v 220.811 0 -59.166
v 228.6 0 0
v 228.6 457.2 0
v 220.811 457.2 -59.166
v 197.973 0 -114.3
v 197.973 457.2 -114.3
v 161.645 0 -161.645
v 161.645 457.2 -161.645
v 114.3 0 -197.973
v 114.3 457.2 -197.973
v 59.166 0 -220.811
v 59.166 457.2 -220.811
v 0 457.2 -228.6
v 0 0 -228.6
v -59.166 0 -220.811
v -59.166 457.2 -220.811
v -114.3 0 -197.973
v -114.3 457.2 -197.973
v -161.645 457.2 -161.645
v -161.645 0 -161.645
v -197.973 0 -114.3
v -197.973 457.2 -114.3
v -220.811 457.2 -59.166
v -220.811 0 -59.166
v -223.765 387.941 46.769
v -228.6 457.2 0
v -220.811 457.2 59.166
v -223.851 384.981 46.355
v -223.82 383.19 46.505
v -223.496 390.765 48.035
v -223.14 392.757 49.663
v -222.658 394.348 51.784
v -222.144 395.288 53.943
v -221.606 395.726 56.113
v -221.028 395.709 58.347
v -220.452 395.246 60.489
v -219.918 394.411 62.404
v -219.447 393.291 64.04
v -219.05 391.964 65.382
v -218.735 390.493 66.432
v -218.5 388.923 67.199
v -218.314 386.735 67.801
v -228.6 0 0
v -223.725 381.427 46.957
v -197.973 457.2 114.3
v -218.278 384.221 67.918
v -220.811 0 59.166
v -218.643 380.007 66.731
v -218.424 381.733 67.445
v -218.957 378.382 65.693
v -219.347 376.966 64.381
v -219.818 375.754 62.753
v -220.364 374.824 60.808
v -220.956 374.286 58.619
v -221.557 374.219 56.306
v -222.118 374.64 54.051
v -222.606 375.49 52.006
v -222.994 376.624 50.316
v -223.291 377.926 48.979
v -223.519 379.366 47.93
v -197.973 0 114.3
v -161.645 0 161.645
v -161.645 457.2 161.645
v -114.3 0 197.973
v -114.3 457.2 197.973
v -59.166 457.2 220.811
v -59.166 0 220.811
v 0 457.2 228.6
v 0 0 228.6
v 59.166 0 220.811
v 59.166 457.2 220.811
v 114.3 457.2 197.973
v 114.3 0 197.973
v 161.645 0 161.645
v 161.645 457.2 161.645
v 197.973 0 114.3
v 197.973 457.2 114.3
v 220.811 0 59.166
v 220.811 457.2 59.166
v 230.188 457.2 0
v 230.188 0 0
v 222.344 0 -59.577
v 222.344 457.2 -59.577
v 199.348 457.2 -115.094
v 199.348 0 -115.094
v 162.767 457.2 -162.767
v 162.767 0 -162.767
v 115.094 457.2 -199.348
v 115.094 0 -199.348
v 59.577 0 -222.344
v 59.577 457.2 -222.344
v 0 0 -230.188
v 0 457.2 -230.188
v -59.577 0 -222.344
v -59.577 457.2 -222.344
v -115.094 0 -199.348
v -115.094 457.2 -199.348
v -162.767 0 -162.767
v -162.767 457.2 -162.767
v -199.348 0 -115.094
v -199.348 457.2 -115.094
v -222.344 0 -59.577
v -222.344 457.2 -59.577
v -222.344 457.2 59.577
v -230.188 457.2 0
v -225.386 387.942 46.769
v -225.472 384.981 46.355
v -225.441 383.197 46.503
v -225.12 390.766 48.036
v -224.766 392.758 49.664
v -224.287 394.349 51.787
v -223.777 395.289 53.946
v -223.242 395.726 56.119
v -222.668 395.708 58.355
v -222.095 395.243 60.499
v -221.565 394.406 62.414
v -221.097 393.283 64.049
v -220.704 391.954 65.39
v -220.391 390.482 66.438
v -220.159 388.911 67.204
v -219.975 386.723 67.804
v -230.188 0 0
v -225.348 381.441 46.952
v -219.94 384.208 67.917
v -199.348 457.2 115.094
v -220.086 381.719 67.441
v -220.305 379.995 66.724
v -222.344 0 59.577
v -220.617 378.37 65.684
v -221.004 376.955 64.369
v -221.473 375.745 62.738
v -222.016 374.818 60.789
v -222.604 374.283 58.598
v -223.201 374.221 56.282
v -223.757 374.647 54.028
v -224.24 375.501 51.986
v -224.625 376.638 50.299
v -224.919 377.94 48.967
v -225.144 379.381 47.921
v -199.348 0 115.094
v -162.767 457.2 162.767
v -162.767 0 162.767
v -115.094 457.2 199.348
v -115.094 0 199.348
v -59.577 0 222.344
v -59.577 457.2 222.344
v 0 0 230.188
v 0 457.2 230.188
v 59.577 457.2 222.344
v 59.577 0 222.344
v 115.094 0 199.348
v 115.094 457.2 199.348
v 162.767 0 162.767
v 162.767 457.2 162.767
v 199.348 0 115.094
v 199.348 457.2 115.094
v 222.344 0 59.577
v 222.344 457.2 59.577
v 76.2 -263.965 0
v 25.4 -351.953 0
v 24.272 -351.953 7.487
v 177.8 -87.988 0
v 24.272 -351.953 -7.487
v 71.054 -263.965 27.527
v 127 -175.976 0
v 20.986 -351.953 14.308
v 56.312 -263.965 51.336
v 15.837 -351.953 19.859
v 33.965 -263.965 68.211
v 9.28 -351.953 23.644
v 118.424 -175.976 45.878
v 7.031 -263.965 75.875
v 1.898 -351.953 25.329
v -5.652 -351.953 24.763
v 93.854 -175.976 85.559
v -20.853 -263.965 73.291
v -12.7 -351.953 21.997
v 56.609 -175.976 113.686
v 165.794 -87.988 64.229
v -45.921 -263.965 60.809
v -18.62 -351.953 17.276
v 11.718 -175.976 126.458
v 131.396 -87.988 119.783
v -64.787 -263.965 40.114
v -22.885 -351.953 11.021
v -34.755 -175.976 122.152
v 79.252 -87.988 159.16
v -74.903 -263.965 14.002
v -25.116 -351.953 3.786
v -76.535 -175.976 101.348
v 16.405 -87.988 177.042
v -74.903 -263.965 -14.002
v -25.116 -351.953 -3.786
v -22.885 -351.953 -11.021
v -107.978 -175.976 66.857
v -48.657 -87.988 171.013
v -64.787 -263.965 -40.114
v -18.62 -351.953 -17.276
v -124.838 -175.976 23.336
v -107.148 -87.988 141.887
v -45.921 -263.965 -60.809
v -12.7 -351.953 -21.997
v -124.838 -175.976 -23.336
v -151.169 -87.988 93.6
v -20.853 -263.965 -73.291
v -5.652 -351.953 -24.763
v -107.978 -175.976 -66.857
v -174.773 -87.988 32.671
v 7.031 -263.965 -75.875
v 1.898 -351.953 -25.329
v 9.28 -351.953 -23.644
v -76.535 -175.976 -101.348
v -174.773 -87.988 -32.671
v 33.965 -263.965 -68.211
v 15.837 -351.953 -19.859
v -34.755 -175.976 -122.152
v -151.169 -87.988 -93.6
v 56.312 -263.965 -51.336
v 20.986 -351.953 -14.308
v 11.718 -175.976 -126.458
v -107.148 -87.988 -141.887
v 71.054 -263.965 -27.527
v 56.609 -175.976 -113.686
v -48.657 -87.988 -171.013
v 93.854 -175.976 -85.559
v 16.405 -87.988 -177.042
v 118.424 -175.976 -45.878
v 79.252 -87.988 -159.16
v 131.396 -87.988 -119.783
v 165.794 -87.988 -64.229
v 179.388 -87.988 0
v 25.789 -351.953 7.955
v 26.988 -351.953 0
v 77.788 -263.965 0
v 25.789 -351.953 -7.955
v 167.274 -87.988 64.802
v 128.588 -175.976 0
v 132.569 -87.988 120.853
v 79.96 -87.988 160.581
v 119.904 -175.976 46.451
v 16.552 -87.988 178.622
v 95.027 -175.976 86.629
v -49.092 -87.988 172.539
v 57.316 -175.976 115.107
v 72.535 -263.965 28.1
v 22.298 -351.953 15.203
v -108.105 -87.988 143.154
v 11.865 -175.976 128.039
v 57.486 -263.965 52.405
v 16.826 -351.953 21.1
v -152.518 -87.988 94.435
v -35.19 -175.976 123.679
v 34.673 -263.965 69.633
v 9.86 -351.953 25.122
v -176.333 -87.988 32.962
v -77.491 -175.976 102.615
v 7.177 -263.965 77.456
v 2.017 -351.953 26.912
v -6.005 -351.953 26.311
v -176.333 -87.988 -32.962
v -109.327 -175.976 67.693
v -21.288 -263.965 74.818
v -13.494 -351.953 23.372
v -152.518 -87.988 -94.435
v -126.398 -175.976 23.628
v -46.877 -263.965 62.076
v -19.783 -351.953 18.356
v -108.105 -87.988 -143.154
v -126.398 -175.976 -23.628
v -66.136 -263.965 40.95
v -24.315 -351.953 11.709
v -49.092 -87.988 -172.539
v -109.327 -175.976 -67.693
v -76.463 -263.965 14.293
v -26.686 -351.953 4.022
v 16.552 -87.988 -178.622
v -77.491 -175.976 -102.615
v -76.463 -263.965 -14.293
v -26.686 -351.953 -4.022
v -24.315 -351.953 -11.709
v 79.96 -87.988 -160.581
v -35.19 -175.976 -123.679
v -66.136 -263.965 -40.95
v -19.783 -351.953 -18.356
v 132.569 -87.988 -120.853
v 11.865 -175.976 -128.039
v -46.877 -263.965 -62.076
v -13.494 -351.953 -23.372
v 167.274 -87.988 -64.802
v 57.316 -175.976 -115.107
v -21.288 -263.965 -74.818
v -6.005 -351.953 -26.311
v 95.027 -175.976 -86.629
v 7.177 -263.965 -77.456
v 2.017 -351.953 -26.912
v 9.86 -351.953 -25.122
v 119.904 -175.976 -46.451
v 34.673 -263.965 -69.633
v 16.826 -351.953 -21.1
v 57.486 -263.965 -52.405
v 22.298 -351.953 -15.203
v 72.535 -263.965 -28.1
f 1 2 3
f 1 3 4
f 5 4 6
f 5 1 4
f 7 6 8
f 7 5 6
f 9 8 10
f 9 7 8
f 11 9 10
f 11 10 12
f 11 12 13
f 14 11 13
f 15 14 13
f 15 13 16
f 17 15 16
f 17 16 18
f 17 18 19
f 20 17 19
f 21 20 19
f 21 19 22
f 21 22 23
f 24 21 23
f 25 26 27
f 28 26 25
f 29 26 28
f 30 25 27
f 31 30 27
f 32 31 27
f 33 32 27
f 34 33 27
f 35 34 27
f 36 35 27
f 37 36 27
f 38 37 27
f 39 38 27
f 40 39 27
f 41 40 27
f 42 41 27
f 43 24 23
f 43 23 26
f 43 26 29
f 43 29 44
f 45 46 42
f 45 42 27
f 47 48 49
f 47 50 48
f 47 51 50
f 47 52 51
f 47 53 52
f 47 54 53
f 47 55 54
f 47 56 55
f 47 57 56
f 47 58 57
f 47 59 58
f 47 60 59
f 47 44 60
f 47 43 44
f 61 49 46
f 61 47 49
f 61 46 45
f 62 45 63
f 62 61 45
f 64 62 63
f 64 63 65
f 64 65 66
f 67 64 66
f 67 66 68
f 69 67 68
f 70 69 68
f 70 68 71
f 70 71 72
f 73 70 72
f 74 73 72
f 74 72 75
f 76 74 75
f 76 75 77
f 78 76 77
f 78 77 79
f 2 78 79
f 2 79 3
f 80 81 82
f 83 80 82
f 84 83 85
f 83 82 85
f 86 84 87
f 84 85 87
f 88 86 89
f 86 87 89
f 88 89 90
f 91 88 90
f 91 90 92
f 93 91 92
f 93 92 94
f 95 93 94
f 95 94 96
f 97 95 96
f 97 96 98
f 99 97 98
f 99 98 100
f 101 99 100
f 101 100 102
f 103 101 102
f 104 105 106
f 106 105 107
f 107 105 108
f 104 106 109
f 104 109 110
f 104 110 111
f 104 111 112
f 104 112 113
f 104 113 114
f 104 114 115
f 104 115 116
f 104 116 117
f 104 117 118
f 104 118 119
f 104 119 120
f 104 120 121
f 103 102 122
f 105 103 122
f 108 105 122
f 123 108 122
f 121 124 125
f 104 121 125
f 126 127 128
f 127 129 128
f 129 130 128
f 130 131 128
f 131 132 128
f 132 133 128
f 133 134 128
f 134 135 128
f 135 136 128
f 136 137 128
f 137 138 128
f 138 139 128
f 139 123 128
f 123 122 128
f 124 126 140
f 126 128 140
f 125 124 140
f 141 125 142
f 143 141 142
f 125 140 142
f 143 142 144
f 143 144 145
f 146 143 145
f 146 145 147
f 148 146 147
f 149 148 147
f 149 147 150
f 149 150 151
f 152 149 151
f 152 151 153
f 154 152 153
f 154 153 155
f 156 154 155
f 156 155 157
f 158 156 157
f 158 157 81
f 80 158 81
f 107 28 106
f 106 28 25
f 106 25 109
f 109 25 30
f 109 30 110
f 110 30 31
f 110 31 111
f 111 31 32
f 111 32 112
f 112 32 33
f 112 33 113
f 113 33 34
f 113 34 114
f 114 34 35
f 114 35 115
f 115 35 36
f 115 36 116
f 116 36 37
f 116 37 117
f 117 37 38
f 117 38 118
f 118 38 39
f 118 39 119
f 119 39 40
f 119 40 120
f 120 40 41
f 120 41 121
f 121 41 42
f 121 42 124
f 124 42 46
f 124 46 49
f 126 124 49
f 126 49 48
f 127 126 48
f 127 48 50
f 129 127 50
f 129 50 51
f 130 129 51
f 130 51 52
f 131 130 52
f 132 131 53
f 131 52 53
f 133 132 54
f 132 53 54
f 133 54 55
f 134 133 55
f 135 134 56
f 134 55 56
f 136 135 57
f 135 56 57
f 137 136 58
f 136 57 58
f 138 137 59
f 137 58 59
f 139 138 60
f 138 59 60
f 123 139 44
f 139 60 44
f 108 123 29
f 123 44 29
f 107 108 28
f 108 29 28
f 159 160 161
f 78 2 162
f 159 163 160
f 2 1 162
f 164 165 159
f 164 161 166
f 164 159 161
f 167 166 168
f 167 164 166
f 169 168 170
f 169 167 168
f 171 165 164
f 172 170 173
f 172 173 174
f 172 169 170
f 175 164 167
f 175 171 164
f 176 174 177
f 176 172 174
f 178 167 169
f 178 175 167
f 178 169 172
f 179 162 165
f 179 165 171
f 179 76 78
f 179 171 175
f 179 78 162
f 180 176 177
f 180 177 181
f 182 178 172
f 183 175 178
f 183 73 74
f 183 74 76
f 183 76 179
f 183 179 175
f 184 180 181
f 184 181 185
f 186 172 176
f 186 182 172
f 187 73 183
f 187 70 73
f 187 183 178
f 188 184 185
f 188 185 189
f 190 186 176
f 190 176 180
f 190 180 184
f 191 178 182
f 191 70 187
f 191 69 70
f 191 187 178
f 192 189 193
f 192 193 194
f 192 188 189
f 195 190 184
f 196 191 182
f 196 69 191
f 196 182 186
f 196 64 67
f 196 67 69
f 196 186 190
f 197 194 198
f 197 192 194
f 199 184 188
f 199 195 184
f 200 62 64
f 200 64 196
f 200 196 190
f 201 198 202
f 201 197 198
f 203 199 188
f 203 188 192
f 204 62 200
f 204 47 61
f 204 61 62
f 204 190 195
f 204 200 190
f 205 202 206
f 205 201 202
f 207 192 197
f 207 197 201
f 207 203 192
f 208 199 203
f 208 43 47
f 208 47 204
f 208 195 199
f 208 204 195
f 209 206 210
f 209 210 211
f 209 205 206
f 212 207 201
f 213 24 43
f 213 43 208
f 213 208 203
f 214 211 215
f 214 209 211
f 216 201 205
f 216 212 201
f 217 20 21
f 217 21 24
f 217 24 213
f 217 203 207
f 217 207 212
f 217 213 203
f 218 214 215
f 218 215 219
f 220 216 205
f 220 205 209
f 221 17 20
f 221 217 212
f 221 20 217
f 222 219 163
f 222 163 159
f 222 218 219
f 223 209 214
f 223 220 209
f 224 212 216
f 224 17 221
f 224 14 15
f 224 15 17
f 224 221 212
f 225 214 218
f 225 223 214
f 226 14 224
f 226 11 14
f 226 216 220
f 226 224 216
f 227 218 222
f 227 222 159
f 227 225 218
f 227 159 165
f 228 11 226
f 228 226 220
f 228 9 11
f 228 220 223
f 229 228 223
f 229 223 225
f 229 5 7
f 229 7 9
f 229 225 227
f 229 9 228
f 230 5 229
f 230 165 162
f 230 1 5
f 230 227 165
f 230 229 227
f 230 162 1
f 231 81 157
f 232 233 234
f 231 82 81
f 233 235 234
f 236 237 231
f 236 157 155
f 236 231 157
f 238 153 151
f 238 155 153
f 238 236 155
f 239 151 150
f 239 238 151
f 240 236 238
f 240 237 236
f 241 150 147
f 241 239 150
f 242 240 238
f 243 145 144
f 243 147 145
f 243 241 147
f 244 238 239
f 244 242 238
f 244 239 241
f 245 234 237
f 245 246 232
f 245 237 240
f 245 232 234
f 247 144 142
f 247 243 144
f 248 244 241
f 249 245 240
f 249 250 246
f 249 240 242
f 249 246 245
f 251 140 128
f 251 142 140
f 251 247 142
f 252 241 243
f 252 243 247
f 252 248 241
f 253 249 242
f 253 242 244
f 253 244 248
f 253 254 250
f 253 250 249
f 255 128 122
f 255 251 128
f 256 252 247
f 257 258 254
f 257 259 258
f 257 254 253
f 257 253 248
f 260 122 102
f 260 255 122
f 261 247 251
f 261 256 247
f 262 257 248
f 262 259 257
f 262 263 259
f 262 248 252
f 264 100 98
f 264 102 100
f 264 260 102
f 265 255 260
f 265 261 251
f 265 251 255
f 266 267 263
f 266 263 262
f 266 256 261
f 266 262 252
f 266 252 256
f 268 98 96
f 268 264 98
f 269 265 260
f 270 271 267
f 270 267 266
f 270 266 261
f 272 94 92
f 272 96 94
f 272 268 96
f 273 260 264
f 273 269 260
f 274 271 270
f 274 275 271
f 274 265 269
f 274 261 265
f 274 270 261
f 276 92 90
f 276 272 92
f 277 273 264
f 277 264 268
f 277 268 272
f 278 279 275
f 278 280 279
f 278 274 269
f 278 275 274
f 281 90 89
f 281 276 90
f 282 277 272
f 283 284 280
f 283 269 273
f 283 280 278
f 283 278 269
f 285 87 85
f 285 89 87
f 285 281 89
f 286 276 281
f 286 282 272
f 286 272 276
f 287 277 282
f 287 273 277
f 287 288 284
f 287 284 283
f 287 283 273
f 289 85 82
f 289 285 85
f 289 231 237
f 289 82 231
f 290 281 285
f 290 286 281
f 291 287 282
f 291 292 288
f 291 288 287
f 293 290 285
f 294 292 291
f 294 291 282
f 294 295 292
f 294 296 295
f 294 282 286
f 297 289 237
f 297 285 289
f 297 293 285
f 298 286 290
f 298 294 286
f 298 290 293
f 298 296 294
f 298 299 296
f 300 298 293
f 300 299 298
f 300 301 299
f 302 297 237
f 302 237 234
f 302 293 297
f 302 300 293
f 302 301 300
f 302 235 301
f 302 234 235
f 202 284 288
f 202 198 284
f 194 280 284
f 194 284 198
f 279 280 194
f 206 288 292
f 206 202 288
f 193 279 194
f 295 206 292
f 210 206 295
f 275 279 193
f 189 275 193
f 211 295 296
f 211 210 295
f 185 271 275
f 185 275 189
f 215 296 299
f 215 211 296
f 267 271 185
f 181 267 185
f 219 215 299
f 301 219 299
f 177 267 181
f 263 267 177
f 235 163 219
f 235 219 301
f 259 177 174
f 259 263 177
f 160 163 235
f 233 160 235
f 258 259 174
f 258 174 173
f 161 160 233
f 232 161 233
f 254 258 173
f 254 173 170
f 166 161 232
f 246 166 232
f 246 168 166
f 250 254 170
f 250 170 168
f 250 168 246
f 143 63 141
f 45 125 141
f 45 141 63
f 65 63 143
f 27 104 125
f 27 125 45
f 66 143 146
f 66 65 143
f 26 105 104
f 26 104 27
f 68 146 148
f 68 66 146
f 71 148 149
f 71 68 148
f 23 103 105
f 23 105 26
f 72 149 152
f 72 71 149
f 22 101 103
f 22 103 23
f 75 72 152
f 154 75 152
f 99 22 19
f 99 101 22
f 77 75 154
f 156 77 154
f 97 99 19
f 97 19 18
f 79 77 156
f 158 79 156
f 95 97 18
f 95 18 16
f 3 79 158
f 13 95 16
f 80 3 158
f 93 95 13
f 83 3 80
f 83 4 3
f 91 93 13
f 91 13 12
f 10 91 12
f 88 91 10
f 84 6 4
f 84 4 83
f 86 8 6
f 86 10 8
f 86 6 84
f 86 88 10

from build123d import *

# Parameters (mm, degrees)
SKETCH7_R           = 230.1875
SKETCH7_R_2         = 228.6
BOSS_EXTRUDE1_DEPTH = 457.2
SKETCH9_R           = 10.795
CUT_EXTRUDE1_DEPTH  = 304.8


with BuildPart() as part:
    # Sketch7 → Boss-Extrude1 (new body)
    with BuildSketch(Plane(origin=(0, 0, 0), x_dir=(1, 0, 0), z_dir=(0, 1, 0))):
        Circle(SKETCH7_R)
        Circle(SKETCH7_R_2, mode=Mode.SUBTRACT)
    extrude(amount=BOSS_EXTRUDE1_DEPTH)

    # Sketch8 → Revolve1 (revolve)
    with BuildSketch(Plane.XY):
        Polygon((228.6, 0), (230.1875, 0), (26.9875, -351.952724098), (25.4, -351.952724098), align=None)
    revolve(axis=Axis((0, 0, 0), (0, -1, 0)))

    # Sketch9 → Cut-Extrude1 (cut)
    with BuildSketch(Plane(origin=(0, 0, 0), x_dir=(0, 0, -1), z_dir=(1, 0, 0))):
        with Locations((-57.15, 384.980800527)):
            Circle(SKETCH9_R)
    extrude(amount=-CUT_EXTRUDE1_DEPTH, mode=Mode.SUBTRACT)


solid = part.part
